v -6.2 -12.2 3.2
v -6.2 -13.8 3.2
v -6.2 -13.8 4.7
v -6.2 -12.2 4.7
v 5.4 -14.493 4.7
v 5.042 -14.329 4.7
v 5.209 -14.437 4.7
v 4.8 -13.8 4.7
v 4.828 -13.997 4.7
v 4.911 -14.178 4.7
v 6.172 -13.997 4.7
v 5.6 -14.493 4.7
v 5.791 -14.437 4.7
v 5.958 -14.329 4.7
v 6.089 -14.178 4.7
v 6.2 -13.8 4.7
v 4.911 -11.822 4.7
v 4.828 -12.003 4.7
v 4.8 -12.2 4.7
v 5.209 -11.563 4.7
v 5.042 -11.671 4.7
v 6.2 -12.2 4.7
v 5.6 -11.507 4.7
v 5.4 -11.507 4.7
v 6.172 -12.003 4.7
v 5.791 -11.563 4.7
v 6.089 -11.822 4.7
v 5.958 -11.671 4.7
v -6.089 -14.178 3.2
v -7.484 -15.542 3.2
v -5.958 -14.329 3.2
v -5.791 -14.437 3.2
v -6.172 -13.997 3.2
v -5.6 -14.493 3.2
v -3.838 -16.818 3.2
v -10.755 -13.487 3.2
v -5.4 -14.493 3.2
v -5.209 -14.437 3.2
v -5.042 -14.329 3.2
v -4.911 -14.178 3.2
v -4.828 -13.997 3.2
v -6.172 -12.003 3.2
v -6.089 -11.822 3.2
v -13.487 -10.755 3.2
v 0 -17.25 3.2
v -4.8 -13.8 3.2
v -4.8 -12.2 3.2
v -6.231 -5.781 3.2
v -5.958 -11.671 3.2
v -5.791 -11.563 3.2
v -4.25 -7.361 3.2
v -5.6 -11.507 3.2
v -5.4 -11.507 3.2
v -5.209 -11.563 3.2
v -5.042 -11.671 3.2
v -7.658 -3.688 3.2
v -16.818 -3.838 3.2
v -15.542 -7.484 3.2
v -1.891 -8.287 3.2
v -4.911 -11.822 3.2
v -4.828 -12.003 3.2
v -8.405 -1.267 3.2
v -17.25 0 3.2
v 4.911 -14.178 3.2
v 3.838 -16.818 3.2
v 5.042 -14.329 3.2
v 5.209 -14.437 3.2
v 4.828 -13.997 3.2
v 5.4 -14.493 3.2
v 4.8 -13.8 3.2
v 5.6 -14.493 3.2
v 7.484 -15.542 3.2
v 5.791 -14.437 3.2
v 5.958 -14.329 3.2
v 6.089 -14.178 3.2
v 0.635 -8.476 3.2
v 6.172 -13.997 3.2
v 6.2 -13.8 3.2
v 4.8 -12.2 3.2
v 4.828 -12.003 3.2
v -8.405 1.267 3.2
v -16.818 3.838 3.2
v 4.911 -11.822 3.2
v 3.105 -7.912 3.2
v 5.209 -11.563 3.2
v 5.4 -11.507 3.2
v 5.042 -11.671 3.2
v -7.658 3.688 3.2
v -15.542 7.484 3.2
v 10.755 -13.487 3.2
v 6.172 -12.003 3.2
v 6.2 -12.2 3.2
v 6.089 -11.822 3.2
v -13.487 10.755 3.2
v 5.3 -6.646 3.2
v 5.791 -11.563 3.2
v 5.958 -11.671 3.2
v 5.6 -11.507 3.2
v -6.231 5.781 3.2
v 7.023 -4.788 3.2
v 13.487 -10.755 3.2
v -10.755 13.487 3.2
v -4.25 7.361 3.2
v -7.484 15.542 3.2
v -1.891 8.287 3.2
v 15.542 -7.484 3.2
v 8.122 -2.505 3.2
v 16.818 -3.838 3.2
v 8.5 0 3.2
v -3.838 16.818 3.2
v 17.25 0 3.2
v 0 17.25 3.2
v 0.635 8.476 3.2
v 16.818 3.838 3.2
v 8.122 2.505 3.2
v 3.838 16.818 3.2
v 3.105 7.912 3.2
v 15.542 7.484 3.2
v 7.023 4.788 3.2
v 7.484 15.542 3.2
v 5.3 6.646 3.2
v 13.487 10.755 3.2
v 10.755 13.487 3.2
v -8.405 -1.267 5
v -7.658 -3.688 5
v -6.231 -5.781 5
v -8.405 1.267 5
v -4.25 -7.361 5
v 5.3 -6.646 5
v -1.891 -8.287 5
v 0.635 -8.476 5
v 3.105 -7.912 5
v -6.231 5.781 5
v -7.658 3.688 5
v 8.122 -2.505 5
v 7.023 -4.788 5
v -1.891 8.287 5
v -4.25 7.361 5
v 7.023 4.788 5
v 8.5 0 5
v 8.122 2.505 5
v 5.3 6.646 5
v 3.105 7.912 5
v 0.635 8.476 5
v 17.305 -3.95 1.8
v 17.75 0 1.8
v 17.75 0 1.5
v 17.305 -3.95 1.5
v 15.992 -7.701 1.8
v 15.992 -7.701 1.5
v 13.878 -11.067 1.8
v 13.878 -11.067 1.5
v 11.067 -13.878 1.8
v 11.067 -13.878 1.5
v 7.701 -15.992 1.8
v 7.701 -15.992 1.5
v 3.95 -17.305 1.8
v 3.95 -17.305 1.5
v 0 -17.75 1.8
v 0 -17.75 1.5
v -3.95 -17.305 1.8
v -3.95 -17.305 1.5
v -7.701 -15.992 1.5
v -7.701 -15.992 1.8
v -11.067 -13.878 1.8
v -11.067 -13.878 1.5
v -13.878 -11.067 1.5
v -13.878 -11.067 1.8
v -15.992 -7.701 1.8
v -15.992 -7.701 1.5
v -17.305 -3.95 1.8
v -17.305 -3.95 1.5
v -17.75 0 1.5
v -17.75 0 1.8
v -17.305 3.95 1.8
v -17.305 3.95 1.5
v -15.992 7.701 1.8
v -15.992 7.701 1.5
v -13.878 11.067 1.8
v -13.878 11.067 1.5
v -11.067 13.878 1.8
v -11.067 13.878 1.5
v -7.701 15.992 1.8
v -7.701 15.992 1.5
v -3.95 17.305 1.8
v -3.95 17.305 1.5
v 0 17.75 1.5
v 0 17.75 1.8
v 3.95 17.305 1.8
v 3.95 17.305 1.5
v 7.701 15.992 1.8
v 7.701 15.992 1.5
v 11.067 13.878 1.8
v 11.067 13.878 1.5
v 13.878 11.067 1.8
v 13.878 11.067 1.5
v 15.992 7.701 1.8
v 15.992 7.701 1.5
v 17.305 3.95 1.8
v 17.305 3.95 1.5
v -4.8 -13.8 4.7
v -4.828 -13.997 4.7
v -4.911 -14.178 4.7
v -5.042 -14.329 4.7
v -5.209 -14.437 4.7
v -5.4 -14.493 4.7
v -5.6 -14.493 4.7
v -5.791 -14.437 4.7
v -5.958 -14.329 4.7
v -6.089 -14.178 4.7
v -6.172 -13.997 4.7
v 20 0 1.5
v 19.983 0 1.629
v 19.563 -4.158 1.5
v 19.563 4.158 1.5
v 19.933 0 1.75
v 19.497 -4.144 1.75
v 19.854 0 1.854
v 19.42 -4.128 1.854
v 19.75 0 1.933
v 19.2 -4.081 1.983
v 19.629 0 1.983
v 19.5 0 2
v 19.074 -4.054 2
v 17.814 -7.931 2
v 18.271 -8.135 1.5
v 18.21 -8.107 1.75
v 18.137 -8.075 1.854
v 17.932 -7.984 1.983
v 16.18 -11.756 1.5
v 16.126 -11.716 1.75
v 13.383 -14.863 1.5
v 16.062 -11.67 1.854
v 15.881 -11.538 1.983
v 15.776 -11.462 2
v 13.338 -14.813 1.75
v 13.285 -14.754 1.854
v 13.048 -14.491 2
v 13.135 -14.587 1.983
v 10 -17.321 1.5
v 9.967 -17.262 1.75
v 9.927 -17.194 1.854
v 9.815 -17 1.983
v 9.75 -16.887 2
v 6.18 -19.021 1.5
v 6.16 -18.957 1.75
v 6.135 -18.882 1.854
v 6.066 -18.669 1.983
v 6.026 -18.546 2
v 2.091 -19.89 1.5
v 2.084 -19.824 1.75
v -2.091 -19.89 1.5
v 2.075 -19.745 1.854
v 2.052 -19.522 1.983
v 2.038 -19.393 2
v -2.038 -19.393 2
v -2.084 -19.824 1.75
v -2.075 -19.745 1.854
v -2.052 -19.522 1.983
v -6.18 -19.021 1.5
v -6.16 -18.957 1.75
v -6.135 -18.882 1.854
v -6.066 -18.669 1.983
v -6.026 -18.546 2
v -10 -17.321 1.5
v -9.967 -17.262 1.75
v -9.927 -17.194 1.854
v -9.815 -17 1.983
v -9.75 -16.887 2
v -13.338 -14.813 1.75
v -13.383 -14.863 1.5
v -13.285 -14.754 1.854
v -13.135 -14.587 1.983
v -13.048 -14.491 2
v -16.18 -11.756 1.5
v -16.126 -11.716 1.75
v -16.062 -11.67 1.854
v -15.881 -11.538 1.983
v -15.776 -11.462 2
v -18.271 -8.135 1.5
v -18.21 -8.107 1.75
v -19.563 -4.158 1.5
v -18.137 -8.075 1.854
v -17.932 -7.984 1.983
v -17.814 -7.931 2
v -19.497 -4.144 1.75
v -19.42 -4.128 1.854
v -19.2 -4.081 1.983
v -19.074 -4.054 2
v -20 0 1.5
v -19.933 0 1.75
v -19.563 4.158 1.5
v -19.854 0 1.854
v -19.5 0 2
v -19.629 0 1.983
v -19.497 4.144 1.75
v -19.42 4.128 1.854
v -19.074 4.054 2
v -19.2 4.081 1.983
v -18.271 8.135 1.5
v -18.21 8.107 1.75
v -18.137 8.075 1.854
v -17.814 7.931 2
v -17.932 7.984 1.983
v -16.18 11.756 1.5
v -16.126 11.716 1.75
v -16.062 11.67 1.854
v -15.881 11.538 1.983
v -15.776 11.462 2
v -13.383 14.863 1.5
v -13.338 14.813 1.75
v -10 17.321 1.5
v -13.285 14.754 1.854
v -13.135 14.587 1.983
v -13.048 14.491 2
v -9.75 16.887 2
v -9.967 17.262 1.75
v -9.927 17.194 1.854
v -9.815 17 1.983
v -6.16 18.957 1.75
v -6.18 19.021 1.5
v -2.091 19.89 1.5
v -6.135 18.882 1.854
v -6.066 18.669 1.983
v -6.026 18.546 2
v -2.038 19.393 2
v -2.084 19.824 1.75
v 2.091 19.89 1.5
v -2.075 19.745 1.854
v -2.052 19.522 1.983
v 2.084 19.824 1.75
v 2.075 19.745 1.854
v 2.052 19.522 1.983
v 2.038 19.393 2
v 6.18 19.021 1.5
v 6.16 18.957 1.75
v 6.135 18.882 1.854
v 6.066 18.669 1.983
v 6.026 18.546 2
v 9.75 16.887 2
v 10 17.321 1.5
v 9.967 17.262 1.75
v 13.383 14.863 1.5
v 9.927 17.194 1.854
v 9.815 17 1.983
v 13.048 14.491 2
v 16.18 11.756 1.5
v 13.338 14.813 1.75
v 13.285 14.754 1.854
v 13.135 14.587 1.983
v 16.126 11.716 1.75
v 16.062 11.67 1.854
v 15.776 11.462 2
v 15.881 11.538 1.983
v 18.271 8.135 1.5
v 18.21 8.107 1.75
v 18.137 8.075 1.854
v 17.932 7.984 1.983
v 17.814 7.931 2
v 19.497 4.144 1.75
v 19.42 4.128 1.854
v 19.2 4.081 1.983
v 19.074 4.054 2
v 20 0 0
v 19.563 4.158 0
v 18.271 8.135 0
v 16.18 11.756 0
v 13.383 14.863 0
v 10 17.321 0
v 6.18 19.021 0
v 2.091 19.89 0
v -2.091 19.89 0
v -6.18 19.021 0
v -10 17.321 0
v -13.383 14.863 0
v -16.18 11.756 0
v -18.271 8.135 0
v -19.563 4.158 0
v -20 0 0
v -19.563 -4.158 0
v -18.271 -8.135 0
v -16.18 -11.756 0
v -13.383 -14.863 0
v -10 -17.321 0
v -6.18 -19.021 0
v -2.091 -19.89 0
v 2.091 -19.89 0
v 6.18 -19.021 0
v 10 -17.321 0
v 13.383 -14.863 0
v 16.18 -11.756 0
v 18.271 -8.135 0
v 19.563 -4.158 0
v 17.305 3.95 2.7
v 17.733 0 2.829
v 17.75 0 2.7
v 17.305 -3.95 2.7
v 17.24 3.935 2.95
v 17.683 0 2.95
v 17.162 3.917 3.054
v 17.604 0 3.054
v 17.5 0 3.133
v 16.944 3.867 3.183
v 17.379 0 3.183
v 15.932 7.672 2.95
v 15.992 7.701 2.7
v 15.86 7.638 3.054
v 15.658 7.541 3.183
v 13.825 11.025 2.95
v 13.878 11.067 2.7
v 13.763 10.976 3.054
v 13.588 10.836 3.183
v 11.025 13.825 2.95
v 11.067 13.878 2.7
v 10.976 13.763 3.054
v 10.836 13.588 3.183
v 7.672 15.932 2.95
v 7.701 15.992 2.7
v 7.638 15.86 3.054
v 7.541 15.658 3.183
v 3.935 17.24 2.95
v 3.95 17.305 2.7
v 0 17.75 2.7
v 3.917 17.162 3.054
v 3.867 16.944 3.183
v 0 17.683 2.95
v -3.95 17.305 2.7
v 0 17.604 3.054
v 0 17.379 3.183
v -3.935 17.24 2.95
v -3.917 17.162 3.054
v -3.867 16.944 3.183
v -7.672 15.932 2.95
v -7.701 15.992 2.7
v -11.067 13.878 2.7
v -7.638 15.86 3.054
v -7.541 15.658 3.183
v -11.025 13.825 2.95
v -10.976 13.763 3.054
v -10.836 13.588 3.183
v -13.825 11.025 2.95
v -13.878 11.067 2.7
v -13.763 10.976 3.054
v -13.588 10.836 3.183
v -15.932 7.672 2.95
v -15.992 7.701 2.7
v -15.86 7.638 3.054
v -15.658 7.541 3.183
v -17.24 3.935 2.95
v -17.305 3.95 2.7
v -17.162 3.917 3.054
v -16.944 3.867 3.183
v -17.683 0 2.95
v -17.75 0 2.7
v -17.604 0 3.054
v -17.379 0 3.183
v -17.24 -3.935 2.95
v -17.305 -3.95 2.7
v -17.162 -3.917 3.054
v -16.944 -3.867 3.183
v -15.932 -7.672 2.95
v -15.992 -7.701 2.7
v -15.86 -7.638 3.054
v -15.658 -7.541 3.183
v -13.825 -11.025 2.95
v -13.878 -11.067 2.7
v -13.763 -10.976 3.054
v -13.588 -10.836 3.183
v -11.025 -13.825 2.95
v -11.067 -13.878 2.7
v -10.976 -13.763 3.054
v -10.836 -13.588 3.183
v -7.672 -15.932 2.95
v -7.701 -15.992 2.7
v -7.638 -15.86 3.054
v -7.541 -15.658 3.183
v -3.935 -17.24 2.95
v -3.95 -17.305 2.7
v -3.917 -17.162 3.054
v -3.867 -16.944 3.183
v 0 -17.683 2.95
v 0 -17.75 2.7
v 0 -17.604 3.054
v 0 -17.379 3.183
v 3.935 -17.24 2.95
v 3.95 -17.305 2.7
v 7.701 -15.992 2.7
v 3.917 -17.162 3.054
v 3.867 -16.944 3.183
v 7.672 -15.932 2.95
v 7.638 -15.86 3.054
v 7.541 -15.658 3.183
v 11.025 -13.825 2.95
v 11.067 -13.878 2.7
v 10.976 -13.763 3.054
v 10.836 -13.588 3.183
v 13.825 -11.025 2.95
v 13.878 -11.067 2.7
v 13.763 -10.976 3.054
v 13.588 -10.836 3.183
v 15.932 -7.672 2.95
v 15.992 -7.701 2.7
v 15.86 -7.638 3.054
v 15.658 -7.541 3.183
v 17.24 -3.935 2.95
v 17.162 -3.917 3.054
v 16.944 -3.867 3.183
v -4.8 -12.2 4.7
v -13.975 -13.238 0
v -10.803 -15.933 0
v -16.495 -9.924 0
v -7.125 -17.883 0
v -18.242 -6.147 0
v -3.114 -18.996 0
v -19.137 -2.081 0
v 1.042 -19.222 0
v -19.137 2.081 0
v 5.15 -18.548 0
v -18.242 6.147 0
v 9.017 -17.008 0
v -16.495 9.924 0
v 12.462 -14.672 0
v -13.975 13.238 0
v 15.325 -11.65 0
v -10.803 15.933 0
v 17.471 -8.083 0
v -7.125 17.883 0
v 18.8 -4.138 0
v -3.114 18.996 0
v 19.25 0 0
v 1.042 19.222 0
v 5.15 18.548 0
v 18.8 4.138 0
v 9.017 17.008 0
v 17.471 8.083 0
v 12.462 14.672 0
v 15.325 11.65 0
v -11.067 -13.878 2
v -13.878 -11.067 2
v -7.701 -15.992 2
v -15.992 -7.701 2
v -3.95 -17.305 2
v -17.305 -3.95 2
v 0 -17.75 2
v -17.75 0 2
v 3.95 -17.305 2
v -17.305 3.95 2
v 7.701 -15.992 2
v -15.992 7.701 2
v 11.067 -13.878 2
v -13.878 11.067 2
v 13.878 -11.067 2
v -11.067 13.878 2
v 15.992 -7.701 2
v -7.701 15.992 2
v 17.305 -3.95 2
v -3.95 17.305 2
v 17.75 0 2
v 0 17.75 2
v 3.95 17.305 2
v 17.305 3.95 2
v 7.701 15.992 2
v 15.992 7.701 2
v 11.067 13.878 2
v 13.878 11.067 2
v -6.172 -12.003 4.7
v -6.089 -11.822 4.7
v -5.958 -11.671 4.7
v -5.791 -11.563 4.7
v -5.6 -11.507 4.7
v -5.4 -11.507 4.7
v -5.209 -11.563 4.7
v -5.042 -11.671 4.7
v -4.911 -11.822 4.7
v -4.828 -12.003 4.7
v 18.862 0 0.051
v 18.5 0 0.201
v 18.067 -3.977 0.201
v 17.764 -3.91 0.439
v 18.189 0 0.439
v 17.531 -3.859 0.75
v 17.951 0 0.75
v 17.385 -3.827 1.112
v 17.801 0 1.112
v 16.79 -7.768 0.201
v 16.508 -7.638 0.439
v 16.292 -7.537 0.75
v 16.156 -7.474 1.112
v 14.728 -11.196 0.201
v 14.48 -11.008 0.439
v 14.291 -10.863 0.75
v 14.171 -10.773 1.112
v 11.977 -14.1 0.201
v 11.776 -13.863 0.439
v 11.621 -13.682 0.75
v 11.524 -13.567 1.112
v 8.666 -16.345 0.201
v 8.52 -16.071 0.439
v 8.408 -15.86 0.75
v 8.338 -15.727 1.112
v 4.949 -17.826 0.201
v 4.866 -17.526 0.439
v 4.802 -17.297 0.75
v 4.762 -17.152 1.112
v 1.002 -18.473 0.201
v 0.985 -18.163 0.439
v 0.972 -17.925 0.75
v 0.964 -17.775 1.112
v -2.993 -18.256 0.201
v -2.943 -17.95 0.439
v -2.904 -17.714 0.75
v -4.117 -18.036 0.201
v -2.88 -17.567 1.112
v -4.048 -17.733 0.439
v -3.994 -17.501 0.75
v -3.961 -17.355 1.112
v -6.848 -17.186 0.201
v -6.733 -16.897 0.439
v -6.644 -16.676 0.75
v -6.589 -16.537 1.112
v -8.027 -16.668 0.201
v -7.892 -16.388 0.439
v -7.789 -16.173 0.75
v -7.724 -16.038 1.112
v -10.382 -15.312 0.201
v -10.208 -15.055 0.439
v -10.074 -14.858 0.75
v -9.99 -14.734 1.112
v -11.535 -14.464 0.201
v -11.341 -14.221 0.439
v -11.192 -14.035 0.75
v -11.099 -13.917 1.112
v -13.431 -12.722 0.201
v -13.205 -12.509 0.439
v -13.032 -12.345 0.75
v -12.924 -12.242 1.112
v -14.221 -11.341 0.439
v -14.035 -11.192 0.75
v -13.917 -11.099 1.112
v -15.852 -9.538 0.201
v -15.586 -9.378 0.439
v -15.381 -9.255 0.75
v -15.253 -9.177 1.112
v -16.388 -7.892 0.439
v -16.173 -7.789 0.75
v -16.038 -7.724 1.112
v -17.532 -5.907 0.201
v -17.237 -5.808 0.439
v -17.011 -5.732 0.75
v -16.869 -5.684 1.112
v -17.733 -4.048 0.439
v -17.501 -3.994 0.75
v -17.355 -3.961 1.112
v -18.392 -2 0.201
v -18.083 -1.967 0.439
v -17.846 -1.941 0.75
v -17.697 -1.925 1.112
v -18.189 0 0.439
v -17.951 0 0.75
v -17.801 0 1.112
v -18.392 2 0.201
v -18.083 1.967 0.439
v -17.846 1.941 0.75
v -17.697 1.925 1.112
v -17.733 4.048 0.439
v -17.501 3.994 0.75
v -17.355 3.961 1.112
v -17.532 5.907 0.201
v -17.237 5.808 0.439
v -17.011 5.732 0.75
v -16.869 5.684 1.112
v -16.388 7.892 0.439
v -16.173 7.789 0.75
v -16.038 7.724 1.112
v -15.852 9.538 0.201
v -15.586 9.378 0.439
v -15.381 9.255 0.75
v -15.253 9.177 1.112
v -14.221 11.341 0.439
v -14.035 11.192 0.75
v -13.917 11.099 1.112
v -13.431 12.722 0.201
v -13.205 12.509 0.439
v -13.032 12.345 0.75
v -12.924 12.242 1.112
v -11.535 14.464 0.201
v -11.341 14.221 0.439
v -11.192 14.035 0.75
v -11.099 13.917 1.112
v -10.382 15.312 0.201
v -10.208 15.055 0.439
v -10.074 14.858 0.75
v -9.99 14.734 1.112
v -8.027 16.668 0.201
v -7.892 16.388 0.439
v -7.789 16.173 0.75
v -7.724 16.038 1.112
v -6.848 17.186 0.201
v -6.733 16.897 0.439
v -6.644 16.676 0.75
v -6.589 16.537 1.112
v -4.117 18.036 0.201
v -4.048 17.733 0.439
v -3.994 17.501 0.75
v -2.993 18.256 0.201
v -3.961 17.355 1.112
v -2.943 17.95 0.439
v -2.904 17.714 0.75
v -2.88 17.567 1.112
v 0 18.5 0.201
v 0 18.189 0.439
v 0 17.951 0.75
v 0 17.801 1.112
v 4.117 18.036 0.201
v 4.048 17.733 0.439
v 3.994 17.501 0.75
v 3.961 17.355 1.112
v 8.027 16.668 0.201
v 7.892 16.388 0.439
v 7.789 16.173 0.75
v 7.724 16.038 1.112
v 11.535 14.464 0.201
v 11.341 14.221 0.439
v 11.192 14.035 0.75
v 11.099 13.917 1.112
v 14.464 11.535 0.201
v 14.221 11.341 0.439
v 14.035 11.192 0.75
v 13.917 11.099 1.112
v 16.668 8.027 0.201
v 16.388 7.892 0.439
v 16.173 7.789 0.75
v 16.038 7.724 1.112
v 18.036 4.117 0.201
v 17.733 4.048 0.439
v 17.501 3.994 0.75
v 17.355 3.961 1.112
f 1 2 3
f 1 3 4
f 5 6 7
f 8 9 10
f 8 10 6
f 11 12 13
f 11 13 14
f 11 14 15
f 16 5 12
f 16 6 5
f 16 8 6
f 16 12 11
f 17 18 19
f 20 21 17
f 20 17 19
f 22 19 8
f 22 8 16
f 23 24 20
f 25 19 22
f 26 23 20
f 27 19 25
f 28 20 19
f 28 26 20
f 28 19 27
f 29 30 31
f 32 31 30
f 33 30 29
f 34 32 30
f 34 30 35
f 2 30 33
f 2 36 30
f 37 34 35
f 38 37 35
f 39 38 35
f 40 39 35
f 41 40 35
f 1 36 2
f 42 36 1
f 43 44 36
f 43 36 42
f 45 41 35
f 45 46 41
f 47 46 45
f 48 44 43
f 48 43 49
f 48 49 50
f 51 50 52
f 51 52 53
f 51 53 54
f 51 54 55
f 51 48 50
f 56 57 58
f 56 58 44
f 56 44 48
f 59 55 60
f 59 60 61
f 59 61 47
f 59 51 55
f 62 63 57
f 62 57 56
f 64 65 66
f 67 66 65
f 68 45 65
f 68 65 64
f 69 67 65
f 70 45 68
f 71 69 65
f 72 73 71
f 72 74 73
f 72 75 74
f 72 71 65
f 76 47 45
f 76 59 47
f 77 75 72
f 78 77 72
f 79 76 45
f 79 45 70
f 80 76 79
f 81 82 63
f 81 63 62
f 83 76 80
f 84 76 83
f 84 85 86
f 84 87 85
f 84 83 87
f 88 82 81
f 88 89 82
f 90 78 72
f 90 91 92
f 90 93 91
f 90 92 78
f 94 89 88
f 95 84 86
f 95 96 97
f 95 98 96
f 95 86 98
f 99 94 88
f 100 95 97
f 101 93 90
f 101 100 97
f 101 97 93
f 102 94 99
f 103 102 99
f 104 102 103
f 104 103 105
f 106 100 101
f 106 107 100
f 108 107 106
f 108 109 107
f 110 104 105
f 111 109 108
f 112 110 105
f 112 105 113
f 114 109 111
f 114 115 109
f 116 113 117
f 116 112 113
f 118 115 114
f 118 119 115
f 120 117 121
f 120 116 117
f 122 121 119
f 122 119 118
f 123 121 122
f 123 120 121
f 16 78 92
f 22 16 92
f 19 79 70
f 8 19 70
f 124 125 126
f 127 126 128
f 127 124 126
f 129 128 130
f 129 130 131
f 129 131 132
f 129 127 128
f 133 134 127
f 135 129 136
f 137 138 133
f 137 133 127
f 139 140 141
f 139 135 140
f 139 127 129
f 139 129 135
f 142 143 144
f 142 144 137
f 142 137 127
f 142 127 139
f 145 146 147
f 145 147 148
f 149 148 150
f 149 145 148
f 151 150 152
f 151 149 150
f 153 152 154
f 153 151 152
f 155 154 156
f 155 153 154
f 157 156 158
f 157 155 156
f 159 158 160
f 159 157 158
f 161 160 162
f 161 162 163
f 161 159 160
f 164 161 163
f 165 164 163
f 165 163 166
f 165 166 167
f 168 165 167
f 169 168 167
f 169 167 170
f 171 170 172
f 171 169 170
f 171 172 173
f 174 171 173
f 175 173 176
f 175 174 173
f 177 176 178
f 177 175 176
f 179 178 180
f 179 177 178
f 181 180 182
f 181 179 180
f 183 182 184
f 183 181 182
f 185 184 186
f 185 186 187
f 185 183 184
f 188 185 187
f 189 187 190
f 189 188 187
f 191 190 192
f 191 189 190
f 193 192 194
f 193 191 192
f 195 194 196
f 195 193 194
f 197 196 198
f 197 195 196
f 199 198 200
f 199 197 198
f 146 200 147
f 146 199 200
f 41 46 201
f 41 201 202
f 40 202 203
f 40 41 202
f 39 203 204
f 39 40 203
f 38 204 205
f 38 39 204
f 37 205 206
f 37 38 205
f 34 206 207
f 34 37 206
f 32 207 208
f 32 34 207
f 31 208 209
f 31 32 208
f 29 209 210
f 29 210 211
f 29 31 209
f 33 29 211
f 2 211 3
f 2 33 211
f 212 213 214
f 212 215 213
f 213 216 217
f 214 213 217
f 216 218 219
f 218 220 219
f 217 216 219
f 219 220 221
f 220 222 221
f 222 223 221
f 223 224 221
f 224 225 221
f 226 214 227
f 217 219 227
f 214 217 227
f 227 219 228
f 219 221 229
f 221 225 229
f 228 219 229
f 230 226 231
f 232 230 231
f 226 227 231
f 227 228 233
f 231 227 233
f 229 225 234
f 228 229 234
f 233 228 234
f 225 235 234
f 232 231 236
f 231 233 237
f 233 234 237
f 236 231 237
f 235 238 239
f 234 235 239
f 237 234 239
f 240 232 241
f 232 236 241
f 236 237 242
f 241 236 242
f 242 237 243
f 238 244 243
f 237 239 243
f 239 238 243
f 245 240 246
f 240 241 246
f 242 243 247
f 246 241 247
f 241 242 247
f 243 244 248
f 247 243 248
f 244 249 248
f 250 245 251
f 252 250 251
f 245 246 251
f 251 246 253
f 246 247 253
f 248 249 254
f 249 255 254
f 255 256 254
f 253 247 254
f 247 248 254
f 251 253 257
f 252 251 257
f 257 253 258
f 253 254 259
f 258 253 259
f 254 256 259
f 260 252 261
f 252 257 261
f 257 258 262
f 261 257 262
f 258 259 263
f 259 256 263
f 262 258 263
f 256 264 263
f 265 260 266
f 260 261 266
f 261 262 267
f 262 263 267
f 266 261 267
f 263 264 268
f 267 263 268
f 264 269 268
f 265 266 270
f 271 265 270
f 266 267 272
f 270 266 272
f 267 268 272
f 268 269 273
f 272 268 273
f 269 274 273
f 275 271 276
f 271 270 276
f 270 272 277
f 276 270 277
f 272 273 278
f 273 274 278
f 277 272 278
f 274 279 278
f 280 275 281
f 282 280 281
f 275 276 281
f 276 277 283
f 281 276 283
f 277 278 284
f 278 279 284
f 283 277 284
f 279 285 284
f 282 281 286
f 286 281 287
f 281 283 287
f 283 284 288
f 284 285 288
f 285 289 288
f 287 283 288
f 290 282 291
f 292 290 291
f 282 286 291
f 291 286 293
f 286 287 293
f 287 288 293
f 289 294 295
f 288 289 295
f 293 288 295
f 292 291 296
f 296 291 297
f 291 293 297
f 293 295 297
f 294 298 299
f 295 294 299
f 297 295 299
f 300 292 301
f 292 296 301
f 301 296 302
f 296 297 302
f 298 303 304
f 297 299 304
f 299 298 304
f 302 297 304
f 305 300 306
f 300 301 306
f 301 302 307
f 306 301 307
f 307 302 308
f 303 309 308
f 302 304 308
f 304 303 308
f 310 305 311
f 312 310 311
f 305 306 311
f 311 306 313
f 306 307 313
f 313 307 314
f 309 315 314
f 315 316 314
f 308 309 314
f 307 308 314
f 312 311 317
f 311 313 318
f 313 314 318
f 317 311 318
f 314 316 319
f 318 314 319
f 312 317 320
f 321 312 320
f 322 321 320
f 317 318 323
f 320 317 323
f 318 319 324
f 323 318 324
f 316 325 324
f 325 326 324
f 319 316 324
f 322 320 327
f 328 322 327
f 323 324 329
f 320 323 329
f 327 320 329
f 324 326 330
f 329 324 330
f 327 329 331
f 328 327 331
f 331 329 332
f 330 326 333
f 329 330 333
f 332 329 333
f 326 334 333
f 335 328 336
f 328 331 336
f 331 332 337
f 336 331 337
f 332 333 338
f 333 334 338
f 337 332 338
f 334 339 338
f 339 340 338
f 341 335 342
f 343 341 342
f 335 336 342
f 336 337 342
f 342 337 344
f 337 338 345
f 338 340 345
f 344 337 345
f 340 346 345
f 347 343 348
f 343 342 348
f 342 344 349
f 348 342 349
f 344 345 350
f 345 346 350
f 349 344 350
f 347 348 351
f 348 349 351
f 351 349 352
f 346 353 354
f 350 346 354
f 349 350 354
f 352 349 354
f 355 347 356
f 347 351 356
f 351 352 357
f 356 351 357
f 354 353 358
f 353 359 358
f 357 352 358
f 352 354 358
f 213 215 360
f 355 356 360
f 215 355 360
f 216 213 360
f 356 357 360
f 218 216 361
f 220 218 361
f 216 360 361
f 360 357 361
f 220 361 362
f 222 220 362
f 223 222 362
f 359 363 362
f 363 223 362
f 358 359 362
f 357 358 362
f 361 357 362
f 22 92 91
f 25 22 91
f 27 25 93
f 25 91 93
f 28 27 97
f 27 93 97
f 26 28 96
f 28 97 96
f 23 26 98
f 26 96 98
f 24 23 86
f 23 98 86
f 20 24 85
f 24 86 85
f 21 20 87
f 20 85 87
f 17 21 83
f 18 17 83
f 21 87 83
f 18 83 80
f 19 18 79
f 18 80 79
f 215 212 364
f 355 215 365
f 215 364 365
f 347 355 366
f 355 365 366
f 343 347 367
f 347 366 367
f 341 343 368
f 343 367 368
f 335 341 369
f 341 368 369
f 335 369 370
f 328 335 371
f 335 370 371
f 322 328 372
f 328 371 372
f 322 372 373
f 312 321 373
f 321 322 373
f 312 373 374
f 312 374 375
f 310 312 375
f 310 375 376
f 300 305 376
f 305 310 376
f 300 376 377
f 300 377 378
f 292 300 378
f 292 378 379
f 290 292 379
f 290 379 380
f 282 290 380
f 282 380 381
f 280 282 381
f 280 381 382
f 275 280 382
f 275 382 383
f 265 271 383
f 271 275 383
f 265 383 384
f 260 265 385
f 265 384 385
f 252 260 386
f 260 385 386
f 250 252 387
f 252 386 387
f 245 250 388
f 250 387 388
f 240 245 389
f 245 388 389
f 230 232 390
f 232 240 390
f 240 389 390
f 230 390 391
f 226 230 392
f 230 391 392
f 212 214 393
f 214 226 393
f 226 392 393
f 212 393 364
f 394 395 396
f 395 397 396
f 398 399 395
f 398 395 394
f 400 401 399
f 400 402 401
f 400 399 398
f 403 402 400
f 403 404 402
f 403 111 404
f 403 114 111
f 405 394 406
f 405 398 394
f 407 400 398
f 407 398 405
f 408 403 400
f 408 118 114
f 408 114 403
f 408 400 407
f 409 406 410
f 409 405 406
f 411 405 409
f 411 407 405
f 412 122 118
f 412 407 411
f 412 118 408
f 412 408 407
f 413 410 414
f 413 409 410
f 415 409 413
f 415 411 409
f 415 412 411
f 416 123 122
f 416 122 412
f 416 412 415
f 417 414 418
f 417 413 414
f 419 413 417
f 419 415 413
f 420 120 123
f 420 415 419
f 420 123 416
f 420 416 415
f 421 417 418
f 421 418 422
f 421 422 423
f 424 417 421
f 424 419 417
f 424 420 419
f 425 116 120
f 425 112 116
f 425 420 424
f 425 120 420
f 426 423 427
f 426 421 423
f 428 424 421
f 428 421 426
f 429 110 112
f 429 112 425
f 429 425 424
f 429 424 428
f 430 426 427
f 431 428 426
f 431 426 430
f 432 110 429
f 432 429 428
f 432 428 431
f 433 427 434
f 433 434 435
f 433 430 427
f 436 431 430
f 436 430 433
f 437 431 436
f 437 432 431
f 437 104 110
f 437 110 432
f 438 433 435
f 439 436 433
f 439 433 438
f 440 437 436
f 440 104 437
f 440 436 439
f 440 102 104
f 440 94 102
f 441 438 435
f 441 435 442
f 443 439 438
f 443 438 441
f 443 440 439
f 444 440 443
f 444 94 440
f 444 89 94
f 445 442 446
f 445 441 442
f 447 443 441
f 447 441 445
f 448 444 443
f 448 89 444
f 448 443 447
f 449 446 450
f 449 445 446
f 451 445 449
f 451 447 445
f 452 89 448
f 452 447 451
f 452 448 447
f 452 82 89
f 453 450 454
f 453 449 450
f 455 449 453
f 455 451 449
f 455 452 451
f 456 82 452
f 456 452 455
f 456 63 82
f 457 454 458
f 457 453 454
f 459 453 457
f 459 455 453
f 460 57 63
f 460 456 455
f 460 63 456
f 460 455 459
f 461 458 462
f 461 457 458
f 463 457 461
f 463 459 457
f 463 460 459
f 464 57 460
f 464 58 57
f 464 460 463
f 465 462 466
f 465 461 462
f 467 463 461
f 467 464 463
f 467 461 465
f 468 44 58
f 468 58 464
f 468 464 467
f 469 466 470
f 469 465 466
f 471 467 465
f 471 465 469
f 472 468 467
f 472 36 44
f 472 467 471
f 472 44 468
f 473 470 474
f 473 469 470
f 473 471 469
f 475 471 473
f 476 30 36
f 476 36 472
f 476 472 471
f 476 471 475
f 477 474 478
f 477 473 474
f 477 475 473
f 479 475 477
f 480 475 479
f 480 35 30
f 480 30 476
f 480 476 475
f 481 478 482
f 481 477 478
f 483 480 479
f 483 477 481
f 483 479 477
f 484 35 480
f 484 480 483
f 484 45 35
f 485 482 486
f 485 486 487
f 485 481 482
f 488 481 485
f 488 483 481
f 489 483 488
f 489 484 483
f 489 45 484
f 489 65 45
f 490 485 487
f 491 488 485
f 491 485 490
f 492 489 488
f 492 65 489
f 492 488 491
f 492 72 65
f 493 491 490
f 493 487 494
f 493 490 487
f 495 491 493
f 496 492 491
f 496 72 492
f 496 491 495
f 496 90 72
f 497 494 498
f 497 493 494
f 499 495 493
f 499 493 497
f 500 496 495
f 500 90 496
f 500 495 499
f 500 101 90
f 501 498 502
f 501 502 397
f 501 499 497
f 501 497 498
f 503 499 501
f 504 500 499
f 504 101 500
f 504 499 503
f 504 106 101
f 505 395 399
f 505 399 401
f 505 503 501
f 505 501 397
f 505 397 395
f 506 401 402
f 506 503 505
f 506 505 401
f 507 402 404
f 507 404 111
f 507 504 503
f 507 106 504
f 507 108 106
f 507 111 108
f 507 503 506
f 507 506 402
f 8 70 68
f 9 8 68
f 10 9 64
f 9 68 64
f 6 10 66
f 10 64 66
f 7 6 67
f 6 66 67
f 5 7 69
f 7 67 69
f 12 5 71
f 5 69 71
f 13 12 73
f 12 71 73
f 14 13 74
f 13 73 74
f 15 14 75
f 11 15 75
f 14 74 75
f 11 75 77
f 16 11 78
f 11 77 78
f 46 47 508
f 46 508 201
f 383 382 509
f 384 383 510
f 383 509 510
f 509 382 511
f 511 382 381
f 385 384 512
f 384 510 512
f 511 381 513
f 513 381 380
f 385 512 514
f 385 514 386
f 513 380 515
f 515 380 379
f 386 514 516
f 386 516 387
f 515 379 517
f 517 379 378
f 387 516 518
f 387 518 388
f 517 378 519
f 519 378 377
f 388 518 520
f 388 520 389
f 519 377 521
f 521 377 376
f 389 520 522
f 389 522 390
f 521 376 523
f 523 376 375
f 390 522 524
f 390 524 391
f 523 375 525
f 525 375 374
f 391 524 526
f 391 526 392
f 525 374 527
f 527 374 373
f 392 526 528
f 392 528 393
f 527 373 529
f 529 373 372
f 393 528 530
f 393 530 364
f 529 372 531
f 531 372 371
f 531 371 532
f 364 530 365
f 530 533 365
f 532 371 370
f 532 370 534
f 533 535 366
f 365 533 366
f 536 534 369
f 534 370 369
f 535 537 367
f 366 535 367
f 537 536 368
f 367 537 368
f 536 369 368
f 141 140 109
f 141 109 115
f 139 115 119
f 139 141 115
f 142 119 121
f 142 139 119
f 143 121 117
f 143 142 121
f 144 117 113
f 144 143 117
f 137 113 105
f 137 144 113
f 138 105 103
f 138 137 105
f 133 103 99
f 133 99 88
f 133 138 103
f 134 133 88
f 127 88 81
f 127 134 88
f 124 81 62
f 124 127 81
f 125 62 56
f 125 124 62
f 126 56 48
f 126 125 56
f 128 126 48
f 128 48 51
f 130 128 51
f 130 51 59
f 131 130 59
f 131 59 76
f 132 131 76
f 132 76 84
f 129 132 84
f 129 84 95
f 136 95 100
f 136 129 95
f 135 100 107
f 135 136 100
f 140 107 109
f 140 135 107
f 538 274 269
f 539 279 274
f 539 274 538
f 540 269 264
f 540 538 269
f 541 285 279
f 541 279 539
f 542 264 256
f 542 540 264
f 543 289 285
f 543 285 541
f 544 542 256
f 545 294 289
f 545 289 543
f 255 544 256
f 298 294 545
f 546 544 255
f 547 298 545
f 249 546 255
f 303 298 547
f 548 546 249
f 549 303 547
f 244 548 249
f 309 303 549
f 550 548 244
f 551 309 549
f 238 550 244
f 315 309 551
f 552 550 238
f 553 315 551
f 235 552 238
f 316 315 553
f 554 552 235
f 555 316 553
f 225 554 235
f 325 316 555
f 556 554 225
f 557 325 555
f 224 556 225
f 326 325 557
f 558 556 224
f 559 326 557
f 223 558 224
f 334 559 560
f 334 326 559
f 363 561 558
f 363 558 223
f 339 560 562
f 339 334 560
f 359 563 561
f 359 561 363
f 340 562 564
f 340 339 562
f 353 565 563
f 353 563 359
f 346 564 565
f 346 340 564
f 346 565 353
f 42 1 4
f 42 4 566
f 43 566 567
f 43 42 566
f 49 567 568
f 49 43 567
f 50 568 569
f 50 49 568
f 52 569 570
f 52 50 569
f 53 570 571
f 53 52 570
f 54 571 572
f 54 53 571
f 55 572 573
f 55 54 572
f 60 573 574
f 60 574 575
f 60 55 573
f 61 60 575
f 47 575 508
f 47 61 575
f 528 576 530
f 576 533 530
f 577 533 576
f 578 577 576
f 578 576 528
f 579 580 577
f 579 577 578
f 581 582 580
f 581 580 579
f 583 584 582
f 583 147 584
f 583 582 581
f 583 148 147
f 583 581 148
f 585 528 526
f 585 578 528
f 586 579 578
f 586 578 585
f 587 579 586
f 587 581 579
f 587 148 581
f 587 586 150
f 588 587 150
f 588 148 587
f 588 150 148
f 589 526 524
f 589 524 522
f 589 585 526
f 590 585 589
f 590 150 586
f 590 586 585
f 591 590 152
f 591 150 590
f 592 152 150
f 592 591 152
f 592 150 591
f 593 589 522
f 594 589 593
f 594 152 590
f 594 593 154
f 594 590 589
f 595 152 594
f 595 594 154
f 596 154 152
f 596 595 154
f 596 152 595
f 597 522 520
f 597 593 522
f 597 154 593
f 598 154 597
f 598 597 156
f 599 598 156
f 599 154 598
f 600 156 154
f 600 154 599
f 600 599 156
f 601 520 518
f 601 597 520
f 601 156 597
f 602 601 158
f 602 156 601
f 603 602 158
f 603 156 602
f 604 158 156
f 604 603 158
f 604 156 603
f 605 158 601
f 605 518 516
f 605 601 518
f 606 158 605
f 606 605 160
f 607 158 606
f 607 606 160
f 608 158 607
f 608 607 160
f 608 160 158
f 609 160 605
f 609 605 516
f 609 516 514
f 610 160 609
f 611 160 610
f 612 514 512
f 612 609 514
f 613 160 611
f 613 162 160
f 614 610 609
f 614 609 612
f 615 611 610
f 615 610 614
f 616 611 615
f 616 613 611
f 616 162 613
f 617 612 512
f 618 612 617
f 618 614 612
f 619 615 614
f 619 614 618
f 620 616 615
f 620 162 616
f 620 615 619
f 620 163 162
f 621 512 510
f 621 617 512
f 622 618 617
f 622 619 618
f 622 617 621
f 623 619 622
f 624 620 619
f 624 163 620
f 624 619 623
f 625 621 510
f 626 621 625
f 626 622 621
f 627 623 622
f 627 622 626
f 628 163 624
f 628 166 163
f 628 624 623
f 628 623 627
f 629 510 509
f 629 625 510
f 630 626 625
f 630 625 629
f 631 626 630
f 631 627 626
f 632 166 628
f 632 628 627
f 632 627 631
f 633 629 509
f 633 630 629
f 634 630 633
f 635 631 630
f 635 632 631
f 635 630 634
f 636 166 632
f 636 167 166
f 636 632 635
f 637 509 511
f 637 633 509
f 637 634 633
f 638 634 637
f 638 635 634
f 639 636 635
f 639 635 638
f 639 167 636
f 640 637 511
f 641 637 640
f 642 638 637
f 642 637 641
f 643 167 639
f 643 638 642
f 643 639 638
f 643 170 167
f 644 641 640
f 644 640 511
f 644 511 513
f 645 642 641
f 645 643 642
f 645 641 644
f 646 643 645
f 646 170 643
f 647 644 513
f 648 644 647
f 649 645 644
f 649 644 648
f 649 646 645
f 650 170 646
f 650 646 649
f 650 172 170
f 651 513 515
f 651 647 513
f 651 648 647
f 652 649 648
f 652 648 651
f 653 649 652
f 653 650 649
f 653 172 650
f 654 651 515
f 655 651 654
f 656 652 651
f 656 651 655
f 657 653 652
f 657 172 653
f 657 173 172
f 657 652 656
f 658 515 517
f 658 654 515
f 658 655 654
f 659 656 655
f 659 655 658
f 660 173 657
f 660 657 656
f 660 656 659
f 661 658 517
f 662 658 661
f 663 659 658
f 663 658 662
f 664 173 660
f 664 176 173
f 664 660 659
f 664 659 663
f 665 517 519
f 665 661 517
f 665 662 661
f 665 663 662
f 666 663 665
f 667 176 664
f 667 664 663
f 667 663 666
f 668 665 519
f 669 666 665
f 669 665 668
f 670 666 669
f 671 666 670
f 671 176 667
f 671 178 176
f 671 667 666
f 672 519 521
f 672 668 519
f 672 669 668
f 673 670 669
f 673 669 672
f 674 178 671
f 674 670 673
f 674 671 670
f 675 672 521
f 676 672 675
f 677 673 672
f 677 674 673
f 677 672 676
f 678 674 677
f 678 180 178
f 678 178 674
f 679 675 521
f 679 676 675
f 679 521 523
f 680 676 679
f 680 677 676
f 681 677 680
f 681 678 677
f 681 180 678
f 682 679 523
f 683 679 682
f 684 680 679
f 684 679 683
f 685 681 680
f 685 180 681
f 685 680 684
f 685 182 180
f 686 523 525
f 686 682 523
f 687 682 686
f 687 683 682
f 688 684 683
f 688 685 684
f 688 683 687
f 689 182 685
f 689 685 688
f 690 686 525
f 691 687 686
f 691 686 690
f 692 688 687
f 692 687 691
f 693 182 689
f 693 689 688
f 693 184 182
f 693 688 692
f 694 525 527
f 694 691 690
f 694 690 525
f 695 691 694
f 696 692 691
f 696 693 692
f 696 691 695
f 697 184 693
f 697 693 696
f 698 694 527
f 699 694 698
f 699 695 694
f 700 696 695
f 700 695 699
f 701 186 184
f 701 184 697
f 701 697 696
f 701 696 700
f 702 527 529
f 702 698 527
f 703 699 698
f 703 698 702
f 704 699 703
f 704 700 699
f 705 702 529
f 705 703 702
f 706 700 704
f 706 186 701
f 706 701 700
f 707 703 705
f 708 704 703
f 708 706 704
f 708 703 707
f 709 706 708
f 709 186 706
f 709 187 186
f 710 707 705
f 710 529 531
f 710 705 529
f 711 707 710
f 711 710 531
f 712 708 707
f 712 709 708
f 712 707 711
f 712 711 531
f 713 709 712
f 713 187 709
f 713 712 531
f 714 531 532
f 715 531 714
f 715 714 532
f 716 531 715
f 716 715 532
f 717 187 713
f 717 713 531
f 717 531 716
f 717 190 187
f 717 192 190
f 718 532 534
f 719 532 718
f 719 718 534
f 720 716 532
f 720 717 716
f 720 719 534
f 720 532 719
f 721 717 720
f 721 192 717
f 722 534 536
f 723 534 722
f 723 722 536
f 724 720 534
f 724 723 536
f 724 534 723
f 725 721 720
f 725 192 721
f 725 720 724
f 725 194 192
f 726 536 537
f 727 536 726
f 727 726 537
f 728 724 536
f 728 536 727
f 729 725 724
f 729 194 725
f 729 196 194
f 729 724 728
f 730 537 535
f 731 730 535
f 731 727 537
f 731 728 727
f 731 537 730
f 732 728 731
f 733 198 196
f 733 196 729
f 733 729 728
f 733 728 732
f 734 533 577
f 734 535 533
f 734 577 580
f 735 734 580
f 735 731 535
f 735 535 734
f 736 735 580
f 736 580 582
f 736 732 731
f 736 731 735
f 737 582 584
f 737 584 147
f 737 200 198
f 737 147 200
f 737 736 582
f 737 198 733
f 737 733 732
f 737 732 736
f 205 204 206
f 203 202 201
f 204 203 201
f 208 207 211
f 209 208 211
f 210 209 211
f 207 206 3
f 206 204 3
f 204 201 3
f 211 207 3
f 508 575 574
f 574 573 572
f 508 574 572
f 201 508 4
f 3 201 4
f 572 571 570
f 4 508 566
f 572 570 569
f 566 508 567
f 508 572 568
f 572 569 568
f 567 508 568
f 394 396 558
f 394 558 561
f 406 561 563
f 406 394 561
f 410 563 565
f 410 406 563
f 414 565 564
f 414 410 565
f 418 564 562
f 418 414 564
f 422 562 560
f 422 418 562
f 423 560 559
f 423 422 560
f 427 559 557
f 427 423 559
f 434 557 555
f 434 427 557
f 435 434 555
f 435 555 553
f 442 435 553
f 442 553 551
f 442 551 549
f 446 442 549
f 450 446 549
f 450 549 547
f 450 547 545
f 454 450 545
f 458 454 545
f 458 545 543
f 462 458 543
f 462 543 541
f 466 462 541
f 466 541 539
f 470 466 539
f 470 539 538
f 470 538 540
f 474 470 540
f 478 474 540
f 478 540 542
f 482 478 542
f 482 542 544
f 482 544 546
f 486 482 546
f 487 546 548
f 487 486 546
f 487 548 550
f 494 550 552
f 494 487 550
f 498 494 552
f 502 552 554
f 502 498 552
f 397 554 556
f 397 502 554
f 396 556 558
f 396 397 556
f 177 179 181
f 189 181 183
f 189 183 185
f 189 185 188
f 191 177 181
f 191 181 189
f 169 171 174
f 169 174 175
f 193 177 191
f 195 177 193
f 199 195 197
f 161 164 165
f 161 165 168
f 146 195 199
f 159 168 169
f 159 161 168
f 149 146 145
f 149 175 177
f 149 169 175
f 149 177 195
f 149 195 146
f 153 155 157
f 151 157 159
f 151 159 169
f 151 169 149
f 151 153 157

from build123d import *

# Parameters (mm, degrees)
SKETCH_1_R          = 20
EXTRUDE_1_DEPTH     = 5
SKETCH_2_OUTSIDE_W  = 53.358
SKETCH_2_OUTSIDE_H  = 53.358
SKETCH_2_OUTSIDE_R  = 17.75
CUT_EXTRUDE_1_DEPTH = 3
SKETCH_3_OUTSIDE_W  = 53.358
SKETCH_3_OUTSIDE_H  = 53.358
SKETCH_3_OUTSIDE_R  = 8.5
CUT_EXTRUDE_2_DEPTH = 1.8
CUT_EXTRUDE_START   = -1.8
SKETCH_4_R          = 17.75
CUT_EXTRUDE_3_DEPTH = 1.8
FILLET_1_R          = 1.5
FILLET_2_R          = 0.5
FILLET_3_R          = 0.5
EXTRUDE_999_DEPTH   = 1.5


with BuildPart() as part:
    # 草图1 → 拉伸1 (new body)
    with BuildSketch(Plane.XY):
        Circle(SKETCH_1_R)
    extrude(amount=EXTRUDE_1_DEPTH)

    # 草图2 outside → 切除-拉伸1 (cut)
    with BuildSketch(Plane.XY.offset(5)):
        Rectangle(SKETCH_2_OUTSIDE_W, SKETCH_2_OUTSIDE_H)
        Circle(SKETCH_2_OUTSIDE_R, mode=Mode.SUBTRACT)
    extrude(amount=-CUT_EXTRUDE_1_DEPTH, mode=Mode.SUBTRACT)

    # 草图3 outside → 切除-拉伸2 (cut)
    with BuildSketch(Plane.XY.offset(5)):
        Rectangle(SKETCH_3_OUTSIDE_W, SKETCH_3_OUTSIDE_H)
        Circle(SKETCH_3_OUTSIDE_R, mode=Mode.SUBTRACT)
    extrude(amount=-CUT_EXTRUDE_2_DEPTH, mode=Mode.SUBTRACT)

    # 草图4 → 切除-拉伸3 (cut)
    with BuildSketch(Plane(origin=(0, 0, 0), x_dir=(-1, 0, 0), z_dir=(0, 0, -1)).offset(CUT_EXTRUDE_START)):
        with Locations(Location((0, 0, 0), (0, 0, 180))):
            Circle(SKETCH_4_R)
    extrude(amount=CUT_EXTRUDE_3_DEPTH, mode=Mode.SUBTRACT)

    # 圆角1
    fillet_1_edges = [part.edges().sort_by_distance(p)[0] for p in [
        (-17.75, 0, 0),
    ]]
    fillet(fillet_1_edges, radius=FILLET_1_R)

    # 圆角2
    fillet_2_edges = [part.edges().sort_by_distance(p)[0] for p in [
        (-20, 0, 2),
    ]]
    fillet(fillet_2_edges, radius=FILLET_2_R)

    # 圆角3
    fillet_3_edges = [part.edges().sort_by_distance(p)[0] for p in [
        (-17.75, 0, 3.2),
    ]]
    fillet(fillet_3_edges, radius=FILLET_3_R)

    # 草图5 → Extrude 999 (add)
    with BuildSketch(Plane.XY.offset(3.2)):
        with BuildLine():
            Line((-4.8, -12.2), (-4.8, -13.8))
            ThreePointArc((-4.8, -13.8), (-5.5, -14.5), (-6.2, -13.8))
            Line((-6.2, -13.8), (-6.2, -12.2))
            ThreePointArc((-6.2, -12.2), (-5.5, -11.5), (-4.8, -12.2))
        make_face()
        with BuildLine():
            Line((4.8, -12.2), (4.8, -13.8))
            ThreePointArc((4.8, -13.8), (5.5, -14.5), (6.2, -13.8))
            Line((6.2, -13.8), (6.2, -12.2))
            ThreePointArc((6.2, -12.2), (5.5, -11.5), (4.8, -12.2))
        make_face()
    extrude(amount=EXTRUDE_999_DEPTH)


solid = part.part
